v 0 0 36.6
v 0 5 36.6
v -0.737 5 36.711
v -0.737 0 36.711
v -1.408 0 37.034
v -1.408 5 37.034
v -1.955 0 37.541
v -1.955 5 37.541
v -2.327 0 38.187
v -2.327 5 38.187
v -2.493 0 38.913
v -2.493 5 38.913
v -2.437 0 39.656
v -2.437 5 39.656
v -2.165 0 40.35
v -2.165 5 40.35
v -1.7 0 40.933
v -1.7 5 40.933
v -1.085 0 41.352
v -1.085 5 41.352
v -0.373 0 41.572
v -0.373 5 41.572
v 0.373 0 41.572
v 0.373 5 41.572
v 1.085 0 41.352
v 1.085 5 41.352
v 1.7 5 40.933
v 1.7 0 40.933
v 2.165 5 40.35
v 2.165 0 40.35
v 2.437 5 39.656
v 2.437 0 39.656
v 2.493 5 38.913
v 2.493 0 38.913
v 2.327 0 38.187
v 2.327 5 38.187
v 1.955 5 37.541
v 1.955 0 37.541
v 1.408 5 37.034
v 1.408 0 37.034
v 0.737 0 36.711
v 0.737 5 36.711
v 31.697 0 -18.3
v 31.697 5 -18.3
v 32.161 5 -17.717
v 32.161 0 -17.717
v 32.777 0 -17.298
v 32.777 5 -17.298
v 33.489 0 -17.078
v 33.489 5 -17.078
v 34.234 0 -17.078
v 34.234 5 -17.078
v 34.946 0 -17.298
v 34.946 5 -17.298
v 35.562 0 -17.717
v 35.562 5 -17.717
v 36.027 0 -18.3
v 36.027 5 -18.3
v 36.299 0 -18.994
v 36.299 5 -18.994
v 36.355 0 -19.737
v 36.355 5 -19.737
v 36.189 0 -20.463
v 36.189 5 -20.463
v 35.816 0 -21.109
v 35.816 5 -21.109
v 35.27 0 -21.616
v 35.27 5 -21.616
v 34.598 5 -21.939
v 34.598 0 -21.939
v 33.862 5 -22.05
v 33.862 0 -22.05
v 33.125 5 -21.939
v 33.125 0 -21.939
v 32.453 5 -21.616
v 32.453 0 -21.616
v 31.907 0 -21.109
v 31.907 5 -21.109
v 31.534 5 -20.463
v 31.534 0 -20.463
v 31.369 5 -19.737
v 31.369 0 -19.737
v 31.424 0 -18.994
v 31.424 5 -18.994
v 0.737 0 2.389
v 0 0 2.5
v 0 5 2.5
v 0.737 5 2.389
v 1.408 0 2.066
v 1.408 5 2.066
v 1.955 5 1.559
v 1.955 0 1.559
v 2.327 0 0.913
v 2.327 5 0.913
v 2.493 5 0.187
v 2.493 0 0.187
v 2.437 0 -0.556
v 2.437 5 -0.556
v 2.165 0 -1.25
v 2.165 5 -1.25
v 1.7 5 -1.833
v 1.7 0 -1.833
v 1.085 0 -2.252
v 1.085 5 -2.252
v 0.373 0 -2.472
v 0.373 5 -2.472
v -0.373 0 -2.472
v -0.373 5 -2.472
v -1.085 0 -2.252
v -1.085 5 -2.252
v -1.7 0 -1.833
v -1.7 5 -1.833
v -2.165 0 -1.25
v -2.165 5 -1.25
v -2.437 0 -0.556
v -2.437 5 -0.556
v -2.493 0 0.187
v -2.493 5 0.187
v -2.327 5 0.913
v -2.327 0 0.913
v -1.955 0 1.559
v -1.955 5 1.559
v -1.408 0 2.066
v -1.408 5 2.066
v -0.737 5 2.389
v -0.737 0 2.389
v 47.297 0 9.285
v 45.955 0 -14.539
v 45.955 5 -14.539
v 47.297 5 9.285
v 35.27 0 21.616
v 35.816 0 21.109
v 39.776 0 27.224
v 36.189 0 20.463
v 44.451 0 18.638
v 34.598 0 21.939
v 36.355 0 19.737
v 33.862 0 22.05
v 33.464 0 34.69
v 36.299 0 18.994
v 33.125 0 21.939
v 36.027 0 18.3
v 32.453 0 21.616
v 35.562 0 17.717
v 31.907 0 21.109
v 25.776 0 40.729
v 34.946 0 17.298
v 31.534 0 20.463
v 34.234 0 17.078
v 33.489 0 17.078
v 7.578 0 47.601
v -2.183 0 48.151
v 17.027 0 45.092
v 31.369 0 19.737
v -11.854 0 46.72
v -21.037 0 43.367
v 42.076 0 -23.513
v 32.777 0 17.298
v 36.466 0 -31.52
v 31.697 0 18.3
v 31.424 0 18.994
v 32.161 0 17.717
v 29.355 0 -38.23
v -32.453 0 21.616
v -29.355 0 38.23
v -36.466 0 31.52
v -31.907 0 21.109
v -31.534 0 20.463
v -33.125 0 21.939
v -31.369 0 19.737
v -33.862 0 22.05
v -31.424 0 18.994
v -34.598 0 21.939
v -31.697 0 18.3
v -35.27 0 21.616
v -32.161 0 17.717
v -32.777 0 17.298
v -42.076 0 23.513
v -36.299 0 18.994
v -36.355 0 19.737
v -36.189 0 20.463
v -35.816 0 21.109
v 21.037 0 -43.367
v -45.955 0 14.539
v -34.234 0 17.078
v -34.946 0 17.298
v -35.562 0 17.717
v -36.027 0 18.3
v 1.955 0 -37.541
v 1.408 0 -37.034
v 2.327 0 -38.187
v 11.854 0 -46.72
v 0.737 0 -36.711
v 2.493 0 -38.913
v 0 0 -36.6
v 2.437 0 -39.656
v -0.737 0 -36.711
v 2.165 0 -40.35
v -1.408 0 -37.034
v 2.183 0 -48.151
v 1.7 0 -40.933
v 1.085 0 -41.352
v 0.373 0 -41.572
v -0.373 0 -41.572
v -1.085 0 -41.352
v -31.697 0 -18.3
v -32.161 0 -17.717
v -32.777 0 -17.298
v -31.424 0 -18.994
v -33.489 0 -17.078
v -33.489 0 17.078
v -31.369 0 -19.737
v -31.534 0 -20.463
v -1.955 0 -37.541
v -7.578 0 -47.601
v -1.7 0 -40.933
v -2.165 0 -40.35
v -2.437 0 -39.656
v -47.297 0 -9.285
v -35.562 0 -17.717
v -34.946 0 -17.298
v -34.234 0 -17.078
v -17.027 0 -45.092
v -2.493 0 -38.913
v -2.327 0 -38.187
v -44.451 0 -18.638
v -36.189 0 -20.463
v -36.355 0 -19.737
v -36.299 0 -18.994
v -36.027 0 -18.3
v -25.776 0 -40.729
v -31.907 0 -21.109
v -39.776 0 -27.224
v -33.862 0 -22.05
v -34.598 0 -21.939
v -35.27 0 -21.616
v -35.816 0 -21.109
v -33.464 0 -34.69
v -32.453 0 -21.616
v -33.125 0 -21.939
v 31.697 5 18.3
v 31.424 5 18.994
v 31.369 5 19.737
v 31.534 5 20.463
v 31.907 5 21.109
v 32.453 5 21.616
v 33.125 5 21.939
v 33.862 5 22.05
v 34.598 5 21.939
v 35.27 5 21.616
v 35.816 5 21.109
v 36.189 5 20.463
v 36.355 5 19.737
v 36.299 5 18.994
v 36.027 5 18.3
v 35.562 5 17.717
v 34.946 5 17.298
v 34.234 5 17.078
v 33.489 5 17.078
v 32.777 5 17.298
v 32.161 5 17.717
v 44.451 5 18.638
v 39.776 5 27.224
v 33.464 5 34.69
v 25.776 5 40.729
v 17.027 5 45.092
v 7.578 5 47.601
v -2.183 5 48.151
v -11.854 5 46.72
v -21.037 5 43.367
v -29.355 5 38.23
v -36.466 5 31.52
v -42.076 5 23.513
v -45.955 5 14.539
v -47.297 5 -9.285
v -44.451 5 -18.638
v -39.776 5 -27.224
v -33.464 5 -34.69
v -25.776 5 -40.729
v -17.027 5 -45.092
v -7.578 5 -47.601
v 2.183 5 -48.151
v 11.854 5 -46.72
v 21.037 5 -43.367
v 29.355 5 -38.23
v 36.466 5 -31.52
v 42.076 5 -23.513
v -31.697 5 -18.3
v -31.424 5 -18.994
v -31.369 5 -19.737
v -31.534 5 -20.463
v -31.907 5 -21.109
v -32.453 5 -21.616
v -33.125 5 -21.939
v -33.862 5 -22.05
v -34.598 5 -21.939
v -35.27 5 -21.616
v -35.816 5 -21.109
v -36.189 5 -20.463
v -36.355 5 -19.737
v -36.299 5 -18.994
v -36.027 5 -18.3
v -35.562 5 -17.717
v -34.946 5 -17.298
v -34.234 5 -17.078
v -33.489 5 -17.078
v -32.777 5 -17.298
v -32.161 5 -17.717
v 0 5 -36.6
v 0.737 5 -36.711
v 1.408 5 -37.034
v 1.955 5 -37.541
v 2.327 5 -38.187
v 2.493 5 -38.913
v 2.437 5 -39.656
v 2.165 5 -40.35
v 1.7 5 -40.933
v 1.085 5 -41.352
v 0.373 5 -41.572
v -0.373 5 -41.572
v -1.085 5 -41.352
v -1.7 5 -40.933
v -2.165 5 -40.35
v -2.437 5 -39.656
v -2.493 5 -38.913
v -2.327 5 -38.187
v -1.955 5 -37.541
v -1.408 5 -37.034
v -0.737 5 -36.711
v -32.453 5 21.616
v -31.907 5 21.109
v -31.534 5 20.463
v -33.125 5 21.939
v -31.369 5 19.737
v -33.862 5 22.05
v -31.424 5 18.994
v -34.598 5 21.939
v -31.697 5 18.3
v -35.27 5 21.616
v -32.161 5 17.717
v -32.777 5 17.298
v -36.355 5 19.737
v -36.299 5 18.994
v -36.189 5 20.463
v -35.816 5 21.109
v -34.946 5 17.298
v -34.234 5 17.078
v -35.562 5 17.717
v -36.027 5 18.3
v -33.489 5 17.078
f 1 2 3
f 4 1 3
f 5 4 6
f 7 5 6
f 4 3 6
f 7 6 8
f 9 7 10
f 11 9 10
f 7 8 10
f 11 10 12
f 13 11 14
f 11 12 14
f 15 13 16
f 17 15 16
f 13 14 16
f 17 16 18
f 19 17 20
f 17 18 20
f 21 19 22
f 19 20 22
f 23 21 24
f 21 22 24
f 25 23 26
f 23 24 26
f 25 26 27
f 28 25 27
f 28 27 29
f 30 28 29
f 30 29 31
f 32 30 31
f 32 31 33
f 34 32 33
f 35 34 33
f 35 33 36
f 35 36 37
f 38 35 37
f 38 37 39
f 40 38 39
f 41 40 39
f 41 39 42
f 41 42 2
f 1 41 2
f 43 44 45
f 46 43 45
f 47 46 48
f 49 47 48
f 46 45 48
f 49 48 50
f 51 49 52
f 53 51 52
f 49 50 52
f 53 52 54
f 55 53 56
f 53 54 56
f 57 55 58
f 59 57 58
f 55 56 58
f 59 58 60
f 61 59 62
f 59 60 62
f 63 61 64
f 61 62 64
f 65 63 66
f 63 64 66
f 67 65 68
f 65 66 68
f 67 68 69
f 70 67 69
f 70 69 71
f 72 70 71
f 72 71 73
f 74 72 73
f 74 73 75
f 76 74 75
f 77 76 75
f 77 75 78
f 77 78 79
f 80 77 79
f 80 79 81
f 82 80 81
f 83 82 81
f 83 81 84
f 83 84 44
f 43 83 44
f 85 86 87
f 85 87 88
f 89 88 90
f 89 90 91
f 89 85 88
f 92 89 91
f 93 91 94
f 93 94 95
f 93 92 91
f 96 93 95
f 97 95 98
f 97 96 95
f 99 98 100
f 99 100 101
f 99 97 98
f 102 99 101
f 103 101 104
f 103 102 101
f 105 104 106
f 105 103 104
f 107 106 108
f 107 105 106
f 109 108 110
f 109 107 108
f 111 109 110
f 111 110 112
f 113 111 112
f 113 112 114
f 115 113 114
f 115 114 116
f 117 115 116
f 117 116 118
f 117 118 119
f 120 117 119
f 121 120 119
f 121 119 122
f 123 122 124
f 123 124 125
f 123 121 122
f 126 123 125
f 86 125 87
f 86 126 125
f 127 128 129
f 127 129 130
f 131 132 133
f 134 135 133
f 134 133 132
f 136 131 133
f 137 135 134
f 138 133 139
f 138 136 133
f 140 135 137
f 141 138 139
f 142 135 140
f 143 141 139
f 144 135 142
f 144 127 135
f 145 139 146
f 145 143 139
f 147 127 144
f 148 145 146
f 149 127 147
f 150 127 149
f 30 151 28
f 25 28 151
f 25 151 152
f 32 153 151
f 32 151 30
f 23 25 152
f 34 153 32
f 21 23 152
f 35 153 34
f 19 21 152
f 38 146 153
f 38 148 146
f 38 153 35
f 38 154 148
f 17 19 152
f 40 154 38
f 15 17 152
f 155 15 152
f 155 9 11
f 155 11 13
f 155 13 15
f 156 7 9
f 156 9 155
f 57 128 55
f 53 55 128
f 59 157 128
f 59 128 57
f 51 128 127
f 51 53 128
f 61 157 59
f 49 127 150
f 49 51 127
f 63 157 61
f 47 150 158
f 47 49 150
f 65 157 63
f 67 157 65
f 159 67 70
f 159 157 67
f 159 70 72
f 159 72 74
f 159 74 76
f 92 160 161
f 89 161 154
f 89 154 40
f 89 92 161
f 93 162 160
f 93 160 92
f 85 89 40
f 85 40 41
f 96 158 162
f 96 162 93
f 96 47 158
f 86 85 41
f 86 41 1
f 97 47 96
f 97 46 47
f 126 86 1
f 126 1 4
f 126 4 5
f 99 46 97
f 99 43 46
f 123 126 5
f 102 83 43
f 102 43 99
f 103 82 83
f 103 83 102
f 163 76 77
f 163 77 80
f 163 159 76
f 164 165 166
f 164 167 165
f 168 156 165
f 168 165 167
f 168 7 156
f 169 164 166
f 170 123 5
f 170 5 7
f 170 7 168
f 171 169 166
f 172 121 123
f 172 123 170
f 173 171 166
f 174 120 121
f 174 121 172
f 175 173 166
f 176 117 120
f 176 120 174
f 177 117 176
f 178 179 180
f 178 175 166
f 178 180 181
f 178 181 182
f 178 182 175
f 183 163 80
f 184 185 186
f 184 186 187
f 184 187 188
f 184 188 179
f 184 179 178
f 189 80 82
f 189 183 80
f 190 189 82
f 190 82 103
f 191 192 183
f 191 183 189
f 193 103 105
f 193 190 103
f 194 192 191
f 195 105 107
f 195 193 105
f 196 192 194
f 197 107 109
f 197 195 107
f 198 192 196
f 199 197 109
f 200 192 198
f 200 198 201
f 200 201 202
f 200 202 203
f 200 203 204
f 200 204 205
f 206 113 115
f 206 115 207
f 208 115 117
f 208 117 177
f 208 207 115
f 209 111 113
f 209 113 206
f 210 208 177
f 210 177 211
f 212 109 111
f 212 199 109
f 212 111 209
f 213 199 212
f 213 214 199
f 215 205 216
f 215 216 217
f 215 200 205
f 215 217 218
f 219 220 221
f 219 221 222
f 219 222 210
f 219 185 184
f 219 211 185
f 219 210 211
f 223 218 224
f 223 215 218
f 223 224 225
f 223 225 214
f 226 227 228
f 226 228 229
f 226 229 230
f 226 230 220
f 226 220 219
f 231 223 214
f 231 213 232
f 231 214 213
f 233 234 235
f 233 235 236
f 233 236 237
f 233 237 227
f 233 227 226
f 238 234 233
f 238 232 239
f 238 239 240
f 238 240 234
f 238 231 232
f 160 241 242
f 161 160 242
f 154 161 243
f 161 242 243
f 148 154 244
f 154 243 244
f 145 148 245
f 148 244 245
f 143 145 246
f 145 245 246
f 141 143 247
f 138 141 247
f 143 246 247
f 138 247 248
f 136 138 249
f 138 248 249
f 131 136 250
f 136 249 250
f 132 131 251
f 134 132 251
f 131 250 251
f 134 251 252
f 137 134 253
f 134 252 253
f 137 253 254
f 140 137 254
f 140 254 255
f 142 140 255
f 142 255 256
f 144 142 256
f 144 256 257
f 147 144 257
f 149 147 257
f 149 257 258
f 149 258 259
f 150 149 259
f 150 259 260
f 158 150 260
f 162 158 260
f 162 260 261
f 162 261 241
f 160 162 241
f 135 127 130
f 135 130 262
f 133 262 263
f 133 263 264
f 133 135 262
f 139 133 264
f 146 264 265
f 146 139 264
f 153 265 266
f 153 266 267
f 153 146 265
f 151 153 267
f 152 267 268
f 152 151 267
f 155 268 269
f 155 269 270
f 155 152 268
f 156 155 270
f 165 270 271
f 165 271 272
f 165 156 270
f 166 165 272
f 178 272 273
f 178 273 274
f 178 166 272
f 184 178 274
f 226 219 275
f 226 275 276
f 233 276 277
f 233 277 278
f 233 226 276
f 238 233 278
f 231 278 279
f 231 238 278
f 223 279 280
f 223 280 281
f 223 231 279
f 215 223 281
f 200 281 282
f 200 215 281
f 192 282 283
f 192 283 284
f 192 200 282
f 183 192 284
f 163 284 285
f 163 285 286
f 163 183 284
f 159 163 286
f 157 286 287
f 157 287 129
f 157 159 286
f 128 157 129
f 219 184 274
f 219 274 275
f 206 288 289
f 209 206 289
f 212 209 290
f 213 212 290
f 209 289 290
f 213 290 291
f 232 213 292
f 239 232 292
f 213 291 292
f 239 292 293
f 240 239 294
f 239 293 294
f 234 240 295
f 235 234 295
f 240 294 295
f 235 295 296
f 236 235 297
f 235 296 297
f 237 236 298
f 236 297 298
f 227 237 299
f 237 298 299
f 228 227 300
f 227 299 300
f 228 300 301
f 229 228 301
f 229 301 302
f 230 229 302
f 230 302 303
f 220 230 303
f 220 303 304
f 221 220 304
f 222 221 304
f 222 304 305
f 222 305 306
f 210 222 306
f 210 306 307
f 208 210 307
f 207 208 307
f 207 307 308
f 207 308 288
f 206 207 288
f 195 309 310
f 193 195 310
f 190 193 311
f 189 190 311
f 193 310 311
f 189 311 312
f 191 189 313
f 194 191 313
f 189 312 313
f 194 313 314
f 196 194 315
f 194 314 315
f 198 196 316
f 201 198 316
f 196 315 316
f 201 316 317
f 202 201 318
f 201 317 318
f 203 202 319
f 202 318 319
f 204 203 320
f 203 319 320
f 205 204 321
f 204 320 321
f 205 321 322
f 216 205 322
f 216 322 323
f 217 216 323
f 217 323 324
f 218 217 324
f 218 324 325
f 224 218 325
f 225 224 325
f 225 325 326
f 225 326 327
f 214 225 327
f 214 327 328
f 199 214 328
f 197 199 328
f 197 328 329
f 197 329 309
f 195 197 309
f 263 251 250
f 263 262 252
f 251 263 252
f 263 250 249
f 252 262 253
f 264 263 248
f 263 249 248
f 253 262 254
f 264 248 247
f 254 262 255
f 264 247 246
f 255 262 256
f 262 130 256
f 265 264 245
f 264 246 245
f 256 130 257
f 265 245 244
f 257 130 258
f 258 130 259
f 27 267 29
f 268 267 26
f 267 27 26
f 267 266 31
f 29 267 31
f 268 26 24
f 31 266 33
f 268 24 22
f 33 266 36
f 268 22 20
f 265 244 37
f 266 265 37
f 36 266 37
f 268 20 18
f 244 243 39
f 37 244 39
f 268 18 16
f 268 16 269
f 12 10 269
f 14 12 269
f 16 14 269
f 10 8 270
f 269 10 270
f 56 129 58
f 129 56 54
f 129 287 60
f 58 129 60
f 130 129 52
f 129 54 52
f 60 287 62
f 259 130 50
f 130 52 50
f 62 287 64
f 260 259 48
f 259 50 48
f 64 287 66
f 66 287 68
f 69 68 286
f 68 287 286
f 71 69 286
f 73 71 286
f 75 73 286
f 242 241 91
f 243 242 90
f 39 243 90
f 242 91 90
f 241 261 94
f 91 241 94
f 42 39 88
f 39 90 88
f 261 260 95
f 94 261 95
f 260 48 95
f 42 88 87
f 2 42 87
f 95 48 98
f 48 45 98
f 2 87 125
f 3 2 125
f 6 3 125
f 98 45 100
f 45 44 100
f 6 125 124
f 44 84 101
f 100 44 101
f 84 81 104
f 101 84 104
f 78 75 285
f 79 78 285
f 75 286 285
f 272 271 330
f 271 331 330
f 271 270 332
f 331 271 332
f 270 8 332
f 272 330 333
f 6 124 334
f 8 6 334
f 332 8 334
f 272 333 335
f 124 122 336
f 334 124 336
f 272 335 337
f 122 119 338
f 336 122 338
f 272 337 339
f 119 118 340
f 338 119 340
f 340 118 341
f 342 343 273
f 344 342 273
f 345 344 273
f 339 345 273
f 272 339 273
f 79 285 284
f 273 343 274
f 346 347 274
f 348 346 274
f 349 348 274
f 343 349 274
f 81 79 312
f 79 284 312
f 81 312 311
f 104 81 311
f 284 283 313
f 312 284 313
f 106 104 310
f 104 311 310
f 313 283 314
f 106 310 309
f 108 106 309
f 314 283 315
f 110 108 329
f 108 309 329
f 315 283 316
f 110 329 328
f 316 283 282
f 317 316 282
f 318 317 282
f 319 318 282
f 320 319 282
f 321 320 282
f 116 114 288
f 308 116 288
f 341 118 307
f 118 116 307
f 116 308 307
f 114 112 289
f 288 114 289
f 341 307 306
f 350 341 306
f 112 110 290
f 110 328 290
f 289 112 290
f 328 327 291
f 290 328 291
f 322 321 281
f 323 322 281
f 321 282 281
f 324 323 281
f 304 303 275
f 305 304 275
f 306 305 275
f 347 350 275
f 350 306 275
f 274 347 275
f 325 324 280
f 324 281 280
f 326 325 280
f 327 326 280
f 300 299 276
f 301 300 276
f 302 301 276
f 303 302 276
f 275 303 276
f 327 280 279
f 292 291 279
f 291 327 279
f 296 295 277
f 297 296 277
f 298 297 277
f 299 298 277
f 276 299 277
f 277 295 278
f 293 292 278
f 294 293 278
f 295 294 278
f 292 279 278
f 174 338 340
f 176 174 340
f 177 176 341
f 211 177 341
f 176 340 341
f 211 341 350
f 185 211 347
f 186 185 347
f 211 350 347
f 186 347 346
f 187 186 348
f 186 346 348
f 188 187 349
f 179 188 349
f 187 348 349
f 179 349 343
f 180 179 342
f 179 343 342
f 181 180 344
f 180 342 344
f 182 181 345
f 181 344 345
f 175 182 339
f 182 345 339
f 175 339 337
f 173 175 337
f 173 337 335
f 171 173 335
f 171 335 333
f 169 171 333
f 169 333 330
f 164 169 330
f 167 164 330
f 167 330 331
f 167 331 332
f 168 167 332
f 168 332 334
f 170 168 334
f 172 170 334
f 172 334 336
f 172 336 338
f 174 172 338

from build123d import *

# Parameters (mm, degrees)
SKETCH_1_R               = 2.5
EXTRUDE_1_DEPTH          = 5
SKETCH_2_R               = 2.5
CUT_EXTRUDE_1_DEPTH      = 20
PATTERN_CIRCULAR_1_COUNT = 6


with BuildPart() as part:
    # Эскиз1 → Бобышка-Вытянуть1 (new body)
    with BuildSketch(Plane(origin=(0, 0, 0), x_dir=(1, 0, 0), z_dir=(0, 1, 0))):
        with BuildLine():
            Line((45.954799299, 14.53947803), (47.297271453, -9.284832422))
            ThreePointArc((47.297271453, -9.284832422), (2.711712187, -48.123659639), (-45.954799299, -14.53947803))
            Line((-45.954799299, -14.53947803), (-47.297271453, 9.284832422))
            ThreePointArc((-47.297271453, 9.284832422), (-2.711712187, 48.123659639), (45.954799299, 14.53947803))
        make_face()
        with Locations(Location((0, 0, 0), (0, 0, 270))):
            Circle(SKETCH_1_R, mode=Mode.SUBTRACT)
    extrude(amount=EXTRUDE_1_DEPTH)

    # Эскиз2 → Вырез-Вытянуть1 (cut)
    with BuildSketch(Plane(origin=(0, 5, 0), x_dir=(1, 0, 0), z_dir=(0, 1, 0))):
        with Locations(Location((0, 39.1, 0), (0, 0, 270))):
            Circle(SKETCH_2_R)
    cut_extrude_1 = extrude(amount=-CUT_EXTRUDE_1_DEPTH, mode=Mode.SUBTRACT)

    # Круговой массив1: Вырез-Вытянуть1 ×6 about axis
    pattern_circular_1_axis = Axis((0, 0, 0), (0, 1, 0))
    for i in range(1, PATTERN_CIRCULAR_1_COUNT):
        add(cut_extrude_1.rotate(pattern_circular_1_axis, i * 360 / PATTERN_CIRCULAR_1_COUNT), mode=Mode.SUBTRACT)


solid = part.part
